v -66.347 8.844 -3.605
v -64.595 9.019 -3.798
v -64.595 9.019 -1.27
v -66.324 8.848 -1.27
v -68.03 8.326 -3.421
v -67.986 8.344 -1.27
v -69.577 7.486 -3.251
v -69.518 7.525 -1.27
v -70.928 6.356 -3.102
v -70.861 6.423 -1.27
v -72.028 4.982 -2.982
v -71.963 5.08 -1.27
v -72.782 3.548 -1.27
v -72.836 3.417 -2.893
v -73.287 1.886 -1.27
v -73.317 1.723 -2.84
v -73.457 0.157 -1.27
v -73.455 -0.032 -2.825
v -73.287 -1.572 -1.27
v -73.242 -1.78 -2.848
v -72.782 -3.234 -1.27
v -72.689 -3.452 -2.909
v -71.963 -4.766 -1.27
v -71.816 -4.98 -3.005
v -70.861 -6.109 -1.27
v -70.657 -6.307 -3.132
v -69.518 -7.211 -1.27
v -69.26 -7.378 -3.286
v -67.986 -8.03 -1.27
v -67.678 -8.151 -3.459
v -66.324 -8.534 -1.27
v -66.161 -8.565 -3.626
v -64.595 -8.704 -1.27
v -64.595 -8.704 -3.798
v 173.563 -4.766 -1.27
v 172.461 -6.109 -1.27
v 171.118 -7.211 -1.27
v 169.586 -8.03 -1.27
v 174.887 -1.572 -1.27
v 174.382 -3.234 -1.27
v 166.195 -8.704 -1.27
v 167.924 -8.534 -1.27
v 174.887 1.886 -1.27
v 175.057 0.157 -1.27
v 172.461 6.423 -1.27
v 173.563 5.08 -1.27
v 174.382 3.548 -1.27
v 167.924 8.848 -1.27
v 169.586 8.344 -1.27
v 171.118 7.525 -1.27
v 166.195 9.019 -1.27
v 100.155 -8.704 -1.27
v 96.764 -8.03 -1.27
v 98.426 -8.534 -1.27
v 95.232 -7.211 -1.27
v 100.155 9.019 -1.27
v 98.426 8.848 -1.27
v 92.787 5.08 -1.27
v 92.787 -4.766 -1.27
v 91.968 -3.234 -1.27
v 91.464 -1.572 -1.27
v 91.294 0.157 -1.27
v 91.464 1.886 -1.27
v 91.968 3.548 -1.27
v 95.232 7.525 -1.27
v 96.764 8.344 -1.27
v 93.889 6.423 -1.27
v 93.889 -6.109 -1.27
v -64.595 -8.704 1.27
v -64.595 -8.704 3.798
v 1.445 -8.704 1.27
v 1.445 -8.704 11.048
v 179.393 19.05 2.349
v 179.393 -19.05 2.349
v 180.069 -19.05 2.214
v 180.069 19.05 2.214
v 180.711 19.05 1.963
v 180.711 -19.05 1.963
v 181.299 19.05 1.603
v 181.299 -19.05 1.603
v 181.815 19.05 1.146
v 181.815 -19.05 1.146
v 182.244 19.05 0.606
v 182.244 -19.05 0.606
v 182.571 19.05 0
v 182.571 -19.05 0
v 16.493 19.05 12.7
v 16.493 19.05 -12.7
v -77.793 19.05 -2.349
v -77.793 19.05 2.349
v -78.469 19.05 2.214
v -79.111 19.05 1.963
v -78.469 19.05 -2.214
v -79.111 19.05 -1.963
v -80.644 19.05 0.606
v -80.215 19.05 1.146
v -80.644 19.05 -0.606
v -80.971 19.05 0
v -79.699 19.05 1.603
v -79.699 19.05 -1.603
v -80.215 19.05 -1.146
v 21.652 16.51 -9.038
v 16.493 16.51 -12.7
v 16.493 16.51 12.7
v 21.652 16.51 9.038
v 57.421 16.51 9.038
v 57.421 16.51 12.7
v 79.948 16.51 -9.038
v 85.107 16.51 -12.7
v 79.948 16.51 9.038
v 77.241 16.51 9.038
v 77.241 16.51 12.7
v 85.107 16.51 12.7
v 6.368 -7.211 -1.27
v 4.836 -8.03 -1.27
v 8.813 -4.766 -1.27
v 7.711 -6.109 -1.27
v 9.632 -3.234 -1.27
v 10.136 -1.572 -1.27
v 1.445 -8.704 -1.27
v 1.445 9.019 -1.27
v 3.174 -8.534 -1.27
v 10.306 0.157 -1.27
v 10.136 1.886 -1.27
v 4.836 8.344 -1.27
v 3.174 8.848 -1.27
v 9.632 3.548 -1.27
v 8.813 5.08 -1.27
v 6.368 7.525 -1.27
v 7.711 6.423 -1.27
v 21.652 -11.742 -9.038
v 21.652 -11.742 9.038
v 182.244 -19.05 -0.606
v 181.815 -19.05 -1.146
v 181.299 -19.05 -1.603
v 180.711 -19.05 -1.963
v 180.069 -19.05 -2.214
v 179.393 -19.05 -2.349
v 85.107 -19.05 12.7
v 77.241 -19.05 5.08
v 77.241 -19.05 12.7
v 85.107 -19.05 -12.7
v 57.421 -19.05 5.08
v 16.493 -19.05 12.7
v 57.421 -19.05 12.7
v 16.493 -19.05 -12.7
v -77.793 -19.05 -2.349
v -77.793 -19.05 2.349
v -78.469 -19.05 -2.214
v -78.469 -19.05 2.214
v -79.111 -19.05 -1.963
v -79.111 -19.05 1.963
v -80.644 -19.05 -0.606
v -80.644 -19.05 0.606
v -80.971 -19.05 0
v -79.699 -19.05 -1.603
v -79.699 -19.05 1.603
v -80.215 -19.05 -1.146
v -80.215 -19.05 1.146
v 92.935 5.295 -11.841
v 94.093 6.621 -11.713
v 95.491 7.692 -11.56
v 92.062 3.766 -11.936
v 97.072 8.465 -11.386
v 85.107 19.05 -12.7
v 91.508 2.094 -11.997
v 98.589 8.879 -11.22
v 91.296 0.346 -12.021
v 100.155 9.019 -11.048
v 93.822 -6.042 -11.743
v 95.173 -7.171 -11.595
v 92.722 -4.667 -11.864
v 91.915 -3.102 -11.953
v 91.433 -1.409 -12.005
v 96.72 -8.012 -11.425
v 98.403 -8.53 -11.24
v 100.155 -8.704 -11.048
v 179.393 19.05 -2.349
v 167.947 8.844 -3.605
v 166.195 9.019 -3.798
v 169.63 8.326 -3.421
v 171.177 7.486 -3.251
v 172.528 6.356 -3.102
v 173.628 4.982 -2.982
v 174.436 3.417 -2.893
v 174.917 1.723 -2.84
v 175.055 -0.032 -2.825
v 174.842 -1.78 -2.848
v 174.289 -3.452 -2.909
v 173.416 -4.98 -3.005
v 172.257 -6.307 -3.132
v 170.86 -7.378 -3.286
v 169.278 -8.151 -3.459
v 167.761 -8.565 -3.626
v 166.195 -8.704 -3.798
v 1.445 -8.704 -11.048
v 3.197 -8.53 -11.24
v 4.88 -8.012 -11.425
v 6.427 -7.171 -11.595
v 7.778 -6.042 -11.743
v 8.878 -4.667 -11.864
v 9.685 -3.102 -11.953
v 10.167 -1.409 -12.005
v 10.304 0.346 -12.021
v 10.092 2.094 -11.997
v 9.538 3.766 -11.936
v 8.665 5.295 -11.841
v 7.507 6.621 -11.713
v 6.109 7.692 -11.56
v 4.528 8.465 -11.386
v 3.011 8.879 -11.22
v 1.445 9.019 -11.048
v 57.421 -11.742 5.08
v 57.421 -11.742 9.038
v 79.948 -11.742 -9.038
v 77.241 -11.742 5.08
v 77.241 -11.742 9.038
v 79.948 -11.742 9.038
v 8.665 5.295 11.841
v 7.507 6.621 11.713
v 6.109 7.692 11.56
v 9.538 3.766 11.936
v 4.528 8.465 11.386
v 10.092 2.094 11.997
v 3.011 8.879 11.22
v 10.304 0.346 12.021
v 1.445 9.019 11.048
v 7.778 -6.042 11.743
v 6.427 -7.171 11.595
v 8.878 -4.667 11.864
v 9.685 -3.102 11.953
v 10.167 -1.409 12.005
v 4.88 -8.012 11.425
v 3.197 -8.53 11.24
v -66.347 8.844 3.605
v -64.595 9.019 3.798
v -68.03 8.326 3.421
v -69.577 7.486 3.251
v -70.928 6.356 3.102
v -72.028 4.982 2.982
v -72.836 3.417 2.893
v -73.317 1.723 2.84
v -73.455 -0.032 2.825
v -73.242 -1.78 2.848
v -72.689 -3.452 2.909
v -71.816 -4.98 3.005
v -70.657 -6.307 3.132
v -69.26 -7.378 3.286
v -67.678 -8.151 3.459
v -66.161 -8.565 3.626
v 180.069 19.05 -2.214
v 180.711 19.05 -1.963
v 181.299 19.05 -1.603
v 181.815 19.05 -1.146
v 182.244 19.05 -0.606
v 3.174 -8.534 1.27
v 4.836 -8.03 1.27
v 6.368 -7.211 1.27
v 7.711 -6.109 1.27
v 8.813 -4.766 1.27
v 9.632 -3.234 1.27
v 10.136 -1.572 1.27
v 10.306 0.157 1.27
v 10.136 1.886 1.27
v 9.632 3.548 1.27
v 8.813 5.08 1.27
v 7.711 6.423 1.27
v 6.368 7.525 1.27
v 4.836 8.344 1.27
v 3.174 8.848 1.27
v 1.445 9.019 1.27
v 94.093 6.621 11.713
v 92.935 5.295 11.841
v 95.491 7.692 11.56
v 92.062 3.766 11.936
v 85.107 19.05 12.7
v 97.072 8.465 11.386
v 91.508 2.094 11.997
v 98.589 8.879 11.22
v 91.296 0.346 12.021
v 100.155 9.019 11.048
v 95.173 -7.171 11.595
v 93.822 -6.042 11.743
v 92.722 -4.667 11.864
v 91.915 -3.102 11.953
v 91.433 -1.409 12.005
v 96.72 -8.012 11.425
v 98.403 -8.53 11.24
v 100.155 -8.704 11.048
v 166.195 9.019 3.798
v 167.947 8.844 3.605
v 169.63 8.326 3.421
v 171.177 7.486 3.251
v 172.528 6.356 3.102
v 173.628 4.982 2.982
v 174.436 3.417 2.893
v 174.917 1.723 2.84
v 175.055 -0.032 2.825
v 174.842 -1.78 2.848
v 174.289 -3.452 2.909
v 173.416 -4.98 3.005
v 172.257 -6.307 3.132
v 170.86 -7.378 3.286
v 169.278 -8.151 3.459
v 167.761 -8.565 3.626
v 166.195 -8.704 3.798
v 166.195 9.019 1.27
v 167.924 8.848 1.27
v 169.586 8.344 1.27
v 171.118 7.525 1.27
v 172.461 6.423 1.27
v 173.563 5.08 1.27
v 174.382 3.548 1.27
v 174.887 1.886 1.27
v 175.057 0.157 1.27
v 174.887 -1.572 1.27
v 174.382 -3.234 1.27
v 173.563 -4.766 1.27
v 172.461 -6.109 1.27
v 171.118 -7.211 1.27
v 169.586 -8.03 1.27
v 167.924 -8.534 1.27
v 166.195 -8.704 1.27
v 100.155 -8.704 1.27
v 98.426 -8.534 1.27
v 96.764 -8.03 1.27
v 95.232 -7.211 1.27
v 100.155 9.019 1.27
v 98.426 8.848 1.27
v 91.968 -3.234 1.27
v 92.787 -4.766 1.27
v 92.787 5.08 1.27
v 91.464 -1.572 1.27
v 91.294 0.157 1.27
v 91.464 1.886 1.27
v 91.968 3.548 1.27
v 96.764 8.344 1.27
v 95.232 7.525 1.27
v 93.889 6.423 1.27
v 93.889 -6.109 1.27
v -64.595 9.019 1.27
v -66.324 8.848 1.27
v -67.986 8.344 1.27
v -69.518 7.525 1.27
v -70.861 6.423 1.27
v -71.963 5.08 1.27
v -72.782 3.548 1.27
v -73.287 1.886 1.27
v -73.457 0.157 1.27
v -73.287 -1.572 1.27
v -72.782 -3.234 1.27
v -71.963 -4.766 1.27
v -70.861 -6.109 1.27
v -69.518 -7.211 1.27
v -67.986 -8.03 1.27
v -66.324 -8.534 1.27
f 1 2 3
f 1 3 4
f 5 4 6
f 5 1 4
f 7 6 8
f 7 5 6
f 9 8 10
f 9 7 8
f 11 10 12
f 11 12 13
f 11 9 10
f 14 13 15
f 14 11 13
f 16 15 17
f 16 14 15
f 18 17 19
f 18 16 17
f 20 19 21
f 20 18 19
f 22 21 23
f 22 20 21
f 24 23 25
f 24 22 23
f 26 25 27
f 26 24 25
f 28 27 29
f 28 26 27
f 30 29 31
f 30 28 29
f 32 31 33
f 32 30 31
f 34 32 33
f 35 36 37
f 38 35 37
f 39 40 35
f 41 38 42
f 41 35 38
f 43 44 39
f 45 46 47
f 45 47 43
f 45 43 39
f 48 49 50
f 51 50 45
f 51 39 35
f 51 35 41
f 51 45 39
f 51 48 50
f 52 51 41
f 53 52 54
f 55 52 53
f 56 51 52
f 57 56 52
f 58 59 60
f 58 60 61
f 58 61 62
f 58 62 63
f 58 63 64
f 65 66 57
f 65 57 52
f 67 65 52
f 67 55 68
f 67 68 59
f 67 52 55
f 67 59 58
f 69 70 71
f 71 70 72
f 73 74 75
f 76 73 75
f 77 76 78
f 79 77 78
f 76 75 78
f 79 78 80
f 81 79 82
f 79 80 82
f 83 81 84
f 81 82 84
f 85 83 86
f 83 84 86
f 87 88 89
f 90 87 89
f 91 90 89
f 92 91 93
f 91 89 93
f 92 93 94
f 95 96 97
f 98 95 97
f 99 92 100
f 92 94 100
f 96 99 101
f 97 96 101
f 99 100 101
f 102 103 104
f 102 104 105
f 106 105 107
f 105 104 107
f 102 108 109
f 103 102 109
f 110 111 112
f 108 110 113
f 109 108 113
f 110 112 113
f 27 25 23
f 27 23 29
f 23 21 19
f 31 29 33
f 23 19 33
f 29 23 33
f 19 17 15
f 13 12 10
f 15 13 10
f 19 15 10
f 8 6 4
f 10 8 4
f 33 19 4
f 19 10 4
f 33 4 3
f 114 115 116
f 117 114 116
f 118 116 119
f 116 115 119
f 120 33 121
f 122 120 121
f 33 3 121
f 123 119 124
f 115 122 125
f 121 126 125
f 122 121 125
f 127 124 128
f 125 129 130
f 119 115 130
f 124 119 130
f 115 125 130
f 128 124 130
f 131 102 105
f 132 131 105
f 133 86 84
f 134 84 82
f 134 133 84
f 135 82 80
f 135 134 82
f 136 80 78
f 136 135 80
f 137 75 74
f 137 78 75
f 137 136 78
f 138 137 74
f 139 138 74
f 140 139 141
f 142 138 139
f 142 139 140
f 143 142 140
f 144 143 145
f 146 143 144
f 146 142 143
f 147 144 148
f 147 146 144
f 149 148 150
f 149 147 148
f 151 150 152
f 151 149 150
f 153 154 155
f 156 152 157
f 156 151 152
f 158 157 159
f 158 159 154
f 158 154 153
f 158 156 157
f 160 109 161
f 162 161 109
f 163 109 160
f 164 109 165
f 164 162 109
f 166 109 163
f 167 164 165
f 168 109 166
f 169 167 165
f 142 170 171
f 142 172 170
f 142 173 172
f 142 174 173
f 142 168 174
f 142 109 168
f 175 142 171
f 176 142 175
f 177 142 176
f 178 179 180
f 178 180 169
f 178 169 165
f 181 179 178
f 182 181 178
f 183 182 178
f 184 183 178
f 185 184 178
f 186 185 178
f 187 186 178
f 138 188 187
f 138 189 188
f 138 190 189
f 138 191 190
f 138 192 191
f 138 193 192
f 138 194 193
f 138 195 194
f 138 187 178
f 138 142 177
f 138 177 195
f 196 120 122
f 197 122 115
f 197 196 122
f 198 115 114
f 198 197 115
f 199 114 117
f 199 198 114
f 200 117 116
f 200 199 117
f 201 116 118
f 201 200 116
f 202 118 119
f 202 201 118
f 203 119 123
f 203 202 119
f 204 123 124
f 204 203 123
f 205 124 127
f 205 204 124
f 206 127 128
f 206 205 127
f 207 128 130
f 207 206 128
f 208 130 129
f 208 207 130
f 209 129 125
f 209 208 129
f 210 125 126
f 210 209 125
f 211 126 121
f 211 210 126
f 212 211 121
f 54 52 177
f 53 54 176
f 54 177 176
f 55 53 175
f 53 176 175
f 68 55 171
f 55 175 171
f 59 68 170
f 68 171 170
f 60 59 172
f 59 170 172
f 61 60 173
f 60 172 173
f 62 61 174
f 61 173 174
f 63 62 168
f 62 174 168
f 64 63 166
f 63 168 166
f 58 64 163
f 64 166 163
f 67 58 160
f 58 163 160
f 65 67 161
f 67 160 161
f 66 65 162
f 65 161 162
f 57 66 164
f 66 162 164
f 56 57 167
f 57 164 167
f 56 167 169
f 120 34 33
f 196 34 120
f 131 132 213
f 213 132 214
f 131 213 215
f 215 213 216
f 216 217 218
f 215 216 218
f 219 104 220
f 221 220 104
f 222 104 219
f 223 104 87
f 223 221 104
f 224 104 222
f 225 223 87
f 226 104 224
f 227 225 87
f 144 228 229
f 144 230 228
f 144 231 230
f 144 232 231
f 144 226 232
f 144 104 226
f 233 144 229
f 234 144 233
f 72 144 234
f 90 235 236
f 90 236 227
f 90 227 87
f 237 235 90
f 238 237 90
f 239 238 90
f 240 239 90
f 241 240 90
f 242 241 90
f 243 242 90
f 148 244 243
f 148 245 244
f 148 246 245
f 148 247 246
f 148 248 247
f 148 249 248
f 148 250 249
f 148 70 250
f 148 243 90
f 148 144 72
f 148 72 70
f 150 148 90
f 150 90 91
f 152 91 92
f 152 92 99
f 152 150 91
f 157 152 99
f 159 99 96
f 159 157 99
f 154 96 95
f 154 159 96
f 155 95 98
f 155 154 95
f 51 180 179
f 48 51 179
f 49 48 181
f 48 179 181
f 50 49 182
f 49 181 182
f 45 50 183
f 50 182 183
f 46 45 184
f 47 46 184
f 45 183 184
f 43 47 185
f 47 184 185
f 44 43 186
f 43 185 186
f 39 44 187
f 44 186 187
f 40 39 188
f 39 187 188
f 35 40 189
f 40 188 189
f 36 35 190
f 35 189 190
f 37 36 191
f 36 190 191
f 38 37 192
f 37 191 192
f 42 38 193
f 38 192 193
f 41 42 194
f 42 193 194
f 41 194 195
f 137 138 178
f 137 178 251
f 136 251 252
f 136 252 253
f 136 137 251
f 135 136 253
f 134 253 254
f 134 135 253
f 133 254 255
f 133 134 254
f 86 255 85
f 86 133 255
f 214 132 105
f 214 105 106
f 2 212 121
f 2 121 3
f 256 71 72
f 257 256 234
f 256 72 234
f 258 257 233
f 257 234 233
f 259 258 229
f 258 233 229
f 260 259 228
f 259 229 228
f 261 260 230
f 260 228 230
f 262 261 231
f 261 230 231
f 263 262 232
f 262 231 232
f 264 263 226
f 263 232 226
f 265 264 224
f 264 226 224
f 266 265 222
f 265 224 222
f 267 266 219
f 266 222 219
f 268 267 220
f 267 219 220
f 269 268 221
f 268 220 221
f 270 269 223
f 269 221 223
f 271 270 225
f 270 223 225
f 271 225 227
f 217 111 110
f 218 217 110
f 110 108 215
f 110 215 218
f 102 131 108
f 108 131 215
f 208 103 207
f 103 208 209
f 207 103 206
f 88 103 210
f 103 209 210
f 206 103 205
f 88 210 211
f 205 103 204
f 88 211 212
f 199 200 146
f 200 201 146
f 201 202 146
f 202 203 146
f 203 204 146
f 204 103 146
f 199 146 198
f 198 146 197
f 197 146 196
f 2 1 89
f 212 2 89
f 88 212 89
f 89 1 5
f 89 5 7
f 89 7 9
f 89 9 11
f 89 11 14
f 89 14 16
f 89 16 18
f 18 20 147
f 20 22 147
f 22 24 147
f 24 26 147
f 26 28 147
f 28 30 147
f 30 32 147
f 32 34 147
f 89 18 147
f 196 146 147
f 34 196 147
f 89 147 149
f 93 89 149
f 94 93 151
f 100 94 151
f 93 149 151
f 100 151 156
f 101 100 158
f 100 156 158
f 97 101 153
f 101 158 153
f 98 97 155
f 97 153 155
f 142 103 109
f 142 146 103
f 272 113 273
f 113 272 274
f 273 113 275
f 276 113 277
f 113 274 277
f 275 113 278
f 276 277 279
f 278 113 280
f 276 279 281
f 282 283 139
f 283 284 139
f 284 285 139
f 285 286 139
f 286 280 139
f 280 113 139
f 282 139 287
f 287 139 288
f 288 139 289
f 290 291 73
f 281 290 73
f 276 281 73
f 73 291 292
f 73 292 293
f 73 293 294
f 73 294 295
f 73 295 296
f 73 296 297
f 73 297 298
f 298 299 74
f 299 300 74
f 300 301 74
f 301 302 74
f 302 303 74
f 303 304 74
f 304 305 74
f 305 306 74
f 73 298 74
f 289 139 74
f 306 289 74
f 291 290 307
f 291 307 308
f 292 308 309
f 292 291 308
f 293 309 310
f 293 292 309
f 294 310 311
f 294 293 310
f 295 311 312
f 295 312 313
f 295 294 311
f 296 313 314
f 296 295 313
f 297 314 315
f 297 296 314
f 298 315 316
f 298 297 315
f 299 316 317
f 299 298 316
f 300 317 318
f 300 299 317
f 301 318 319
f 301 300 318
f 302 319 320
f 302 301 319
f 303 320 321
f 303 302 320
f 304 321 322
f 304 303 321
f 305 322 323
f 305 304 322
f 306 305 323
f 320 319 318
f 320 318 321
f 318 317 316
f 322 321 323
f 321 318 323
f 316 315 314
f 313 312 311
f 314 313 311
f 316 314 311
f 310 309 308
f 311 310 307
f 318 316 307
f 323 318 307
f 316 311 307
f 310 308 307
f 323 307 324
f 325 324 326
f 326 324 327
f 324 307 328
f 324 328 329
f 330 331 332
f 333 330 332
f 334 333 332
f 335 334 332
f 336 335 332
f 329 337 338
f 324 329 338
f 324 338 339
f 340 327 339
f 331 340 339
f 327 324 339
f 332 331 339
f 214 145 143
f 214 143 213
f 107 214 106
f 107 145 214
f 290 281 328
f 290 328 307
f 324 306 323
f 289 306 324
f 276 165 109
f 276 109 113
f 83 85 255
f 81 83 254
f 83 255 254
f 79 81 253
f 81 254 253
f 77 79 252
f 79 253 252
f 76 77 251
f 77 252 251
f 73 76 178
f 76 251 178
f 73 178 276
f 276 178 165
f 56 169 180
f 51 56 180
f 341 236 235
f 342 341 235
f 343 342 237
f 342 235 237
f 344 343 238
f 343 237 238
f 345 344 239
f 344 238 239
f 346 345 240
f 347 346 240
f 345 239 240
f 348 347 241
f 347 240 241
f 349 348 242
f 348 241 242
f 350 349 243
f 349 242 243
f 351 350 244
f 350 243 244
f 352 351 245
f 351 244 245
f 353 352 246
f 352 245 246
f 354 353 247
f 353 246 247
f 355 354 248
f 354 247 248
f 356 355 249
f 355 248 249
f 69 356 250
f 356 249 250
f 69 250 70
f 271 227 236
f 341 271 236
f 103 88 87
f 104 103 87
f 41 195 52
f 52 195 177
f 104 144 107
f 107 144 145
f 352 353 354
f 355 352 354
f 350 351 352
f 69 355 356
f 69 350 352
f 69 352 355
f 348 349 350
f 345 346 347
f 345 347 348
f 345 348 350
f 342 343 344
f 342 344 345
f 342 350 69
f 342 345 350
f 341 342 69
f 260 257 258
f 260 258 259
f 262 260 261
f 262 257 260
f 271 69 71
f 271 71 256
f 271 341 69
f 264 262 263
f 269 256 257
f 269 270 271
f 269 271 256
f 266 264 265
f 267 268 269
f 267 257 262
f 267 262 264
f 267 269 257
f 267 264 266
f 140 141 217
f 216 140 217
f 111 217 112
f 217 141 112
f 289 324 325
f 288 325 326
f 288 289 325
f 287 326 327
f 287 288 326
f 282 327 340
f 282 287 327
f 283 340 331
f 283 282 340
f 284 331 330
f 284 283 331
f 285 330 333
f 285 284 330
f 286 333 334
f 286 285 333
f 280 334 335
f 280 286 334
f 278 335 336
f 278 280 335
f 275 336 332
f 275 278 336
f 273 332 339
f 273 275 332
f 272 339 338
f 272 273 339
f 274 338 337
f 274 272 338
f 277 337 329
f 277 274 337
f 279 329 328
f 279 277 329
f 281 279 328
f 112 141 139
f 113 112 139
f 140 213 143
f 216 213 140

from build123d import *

# Parameters (mm, degrees)
F1_DEPTH      = 19.05
F4_DEPTH      = 11.43
F8_W          = 58.2950823009
F8_H          = 18.0758163333
F9_DEPTH      = 19.051
F9_DEPTH_BACK = 11.74174
F11_W         = 68.613074236
F11_H         = 25.4
F12_DEPTH     = 2.54
F13_W         = 19.8203250766
F13_H         = 44.8987269774
F14_DEPTH     = 7.62


with BuildPart() as f1:
    # F0 (on Front) → F1 (new body, symmetric)
    with BuildSketch(Plane.XZ):
        with BuildLine():
            Line((16.493462882, 12.7), (-77.7931159433, 2.3487282923))
            ThreePointArc((-77.7931159433, 2.3487282923), (-79.6990393329, 1.6031312535), (-80.9712142796, 0))
            Line((-80.9712142796, 0), (50.8, 0))
            Line((50.8, 0), (50.8, 12.7))
            Line((50.8, 12.7), (16.493462882, 12.7))
        make_face()
    extrude(amount=F1_DEPTH, both=True)

    # F3 (on offset) → F4 (cut)
    with BuildSketch(Plane.XY.offset(12.7)):
        with BuildLine():
            Line((-64.5951760395, -8.7044802925), (1.4448239605, -8.7044802925))
            ThreePointArc((1.4448239605, -8.7044802925), (10.3064292543, 0.1571250013), (1.4448239605, 9.0187302952))
            Line((1.4448239605, 9.0187302952), (-64.5951760395, 9.0187302952))
            ThreePointArc((-64.5951760395, 9.0187302952), (-73.4567813333, 0.1571250013), (-64.5951760395, -8.7044802925))
        make_face()
    extrude(amount=-F4_DEPTH, mode=Mode.SUBTRACT)

    # F5: F1 across plane


with BuildPart() as f1_1:
    add(f1.part)
    add(f1.part.mirror(Plane.XY))

    # F7: F1 across plane


with BuildPart() as f1_2:
    add(f1_1.part)
    add(f1_1.part.mirror(Plane.YZ.offset(50.8)))

    # F8 (on Front) → F9 (cut, two sides)
    with BuildSketch(Plane.XZ) as f9_sk:
        with Locations((50.8, 0)):
            Rectangle(F8_W, F8_H)
    extrude(amount=-F9_DEPTH, mode=Mode.SUBTRACT)
    extrude(f9_sk.sketch, amount=F9_DEPTH_BACK, mode=Mode.SUBTRACT)

    # F11 (on offset) → F12 (cut)
    with BuildSketch(Plane.XZ.offset(-19.05)):
        with Locations((50.8, 0)):
            Rectangle(F11_W, F11_H)
    extrude(amount=F12_DEPTH, mode=Mode.SUBTRACT)

    # F13 (on offset) → F14 (cut)
    with BuildSketch(Plane.XY.offset(12.7)):
        with Locations((67.3308186233, -3.4829550423)):
            Rectangle(F13_W, F13_H)
    extrude(amount=-F14_DEPTH, mode=Mode.SUBTRACT)


solid = f1_2.part
